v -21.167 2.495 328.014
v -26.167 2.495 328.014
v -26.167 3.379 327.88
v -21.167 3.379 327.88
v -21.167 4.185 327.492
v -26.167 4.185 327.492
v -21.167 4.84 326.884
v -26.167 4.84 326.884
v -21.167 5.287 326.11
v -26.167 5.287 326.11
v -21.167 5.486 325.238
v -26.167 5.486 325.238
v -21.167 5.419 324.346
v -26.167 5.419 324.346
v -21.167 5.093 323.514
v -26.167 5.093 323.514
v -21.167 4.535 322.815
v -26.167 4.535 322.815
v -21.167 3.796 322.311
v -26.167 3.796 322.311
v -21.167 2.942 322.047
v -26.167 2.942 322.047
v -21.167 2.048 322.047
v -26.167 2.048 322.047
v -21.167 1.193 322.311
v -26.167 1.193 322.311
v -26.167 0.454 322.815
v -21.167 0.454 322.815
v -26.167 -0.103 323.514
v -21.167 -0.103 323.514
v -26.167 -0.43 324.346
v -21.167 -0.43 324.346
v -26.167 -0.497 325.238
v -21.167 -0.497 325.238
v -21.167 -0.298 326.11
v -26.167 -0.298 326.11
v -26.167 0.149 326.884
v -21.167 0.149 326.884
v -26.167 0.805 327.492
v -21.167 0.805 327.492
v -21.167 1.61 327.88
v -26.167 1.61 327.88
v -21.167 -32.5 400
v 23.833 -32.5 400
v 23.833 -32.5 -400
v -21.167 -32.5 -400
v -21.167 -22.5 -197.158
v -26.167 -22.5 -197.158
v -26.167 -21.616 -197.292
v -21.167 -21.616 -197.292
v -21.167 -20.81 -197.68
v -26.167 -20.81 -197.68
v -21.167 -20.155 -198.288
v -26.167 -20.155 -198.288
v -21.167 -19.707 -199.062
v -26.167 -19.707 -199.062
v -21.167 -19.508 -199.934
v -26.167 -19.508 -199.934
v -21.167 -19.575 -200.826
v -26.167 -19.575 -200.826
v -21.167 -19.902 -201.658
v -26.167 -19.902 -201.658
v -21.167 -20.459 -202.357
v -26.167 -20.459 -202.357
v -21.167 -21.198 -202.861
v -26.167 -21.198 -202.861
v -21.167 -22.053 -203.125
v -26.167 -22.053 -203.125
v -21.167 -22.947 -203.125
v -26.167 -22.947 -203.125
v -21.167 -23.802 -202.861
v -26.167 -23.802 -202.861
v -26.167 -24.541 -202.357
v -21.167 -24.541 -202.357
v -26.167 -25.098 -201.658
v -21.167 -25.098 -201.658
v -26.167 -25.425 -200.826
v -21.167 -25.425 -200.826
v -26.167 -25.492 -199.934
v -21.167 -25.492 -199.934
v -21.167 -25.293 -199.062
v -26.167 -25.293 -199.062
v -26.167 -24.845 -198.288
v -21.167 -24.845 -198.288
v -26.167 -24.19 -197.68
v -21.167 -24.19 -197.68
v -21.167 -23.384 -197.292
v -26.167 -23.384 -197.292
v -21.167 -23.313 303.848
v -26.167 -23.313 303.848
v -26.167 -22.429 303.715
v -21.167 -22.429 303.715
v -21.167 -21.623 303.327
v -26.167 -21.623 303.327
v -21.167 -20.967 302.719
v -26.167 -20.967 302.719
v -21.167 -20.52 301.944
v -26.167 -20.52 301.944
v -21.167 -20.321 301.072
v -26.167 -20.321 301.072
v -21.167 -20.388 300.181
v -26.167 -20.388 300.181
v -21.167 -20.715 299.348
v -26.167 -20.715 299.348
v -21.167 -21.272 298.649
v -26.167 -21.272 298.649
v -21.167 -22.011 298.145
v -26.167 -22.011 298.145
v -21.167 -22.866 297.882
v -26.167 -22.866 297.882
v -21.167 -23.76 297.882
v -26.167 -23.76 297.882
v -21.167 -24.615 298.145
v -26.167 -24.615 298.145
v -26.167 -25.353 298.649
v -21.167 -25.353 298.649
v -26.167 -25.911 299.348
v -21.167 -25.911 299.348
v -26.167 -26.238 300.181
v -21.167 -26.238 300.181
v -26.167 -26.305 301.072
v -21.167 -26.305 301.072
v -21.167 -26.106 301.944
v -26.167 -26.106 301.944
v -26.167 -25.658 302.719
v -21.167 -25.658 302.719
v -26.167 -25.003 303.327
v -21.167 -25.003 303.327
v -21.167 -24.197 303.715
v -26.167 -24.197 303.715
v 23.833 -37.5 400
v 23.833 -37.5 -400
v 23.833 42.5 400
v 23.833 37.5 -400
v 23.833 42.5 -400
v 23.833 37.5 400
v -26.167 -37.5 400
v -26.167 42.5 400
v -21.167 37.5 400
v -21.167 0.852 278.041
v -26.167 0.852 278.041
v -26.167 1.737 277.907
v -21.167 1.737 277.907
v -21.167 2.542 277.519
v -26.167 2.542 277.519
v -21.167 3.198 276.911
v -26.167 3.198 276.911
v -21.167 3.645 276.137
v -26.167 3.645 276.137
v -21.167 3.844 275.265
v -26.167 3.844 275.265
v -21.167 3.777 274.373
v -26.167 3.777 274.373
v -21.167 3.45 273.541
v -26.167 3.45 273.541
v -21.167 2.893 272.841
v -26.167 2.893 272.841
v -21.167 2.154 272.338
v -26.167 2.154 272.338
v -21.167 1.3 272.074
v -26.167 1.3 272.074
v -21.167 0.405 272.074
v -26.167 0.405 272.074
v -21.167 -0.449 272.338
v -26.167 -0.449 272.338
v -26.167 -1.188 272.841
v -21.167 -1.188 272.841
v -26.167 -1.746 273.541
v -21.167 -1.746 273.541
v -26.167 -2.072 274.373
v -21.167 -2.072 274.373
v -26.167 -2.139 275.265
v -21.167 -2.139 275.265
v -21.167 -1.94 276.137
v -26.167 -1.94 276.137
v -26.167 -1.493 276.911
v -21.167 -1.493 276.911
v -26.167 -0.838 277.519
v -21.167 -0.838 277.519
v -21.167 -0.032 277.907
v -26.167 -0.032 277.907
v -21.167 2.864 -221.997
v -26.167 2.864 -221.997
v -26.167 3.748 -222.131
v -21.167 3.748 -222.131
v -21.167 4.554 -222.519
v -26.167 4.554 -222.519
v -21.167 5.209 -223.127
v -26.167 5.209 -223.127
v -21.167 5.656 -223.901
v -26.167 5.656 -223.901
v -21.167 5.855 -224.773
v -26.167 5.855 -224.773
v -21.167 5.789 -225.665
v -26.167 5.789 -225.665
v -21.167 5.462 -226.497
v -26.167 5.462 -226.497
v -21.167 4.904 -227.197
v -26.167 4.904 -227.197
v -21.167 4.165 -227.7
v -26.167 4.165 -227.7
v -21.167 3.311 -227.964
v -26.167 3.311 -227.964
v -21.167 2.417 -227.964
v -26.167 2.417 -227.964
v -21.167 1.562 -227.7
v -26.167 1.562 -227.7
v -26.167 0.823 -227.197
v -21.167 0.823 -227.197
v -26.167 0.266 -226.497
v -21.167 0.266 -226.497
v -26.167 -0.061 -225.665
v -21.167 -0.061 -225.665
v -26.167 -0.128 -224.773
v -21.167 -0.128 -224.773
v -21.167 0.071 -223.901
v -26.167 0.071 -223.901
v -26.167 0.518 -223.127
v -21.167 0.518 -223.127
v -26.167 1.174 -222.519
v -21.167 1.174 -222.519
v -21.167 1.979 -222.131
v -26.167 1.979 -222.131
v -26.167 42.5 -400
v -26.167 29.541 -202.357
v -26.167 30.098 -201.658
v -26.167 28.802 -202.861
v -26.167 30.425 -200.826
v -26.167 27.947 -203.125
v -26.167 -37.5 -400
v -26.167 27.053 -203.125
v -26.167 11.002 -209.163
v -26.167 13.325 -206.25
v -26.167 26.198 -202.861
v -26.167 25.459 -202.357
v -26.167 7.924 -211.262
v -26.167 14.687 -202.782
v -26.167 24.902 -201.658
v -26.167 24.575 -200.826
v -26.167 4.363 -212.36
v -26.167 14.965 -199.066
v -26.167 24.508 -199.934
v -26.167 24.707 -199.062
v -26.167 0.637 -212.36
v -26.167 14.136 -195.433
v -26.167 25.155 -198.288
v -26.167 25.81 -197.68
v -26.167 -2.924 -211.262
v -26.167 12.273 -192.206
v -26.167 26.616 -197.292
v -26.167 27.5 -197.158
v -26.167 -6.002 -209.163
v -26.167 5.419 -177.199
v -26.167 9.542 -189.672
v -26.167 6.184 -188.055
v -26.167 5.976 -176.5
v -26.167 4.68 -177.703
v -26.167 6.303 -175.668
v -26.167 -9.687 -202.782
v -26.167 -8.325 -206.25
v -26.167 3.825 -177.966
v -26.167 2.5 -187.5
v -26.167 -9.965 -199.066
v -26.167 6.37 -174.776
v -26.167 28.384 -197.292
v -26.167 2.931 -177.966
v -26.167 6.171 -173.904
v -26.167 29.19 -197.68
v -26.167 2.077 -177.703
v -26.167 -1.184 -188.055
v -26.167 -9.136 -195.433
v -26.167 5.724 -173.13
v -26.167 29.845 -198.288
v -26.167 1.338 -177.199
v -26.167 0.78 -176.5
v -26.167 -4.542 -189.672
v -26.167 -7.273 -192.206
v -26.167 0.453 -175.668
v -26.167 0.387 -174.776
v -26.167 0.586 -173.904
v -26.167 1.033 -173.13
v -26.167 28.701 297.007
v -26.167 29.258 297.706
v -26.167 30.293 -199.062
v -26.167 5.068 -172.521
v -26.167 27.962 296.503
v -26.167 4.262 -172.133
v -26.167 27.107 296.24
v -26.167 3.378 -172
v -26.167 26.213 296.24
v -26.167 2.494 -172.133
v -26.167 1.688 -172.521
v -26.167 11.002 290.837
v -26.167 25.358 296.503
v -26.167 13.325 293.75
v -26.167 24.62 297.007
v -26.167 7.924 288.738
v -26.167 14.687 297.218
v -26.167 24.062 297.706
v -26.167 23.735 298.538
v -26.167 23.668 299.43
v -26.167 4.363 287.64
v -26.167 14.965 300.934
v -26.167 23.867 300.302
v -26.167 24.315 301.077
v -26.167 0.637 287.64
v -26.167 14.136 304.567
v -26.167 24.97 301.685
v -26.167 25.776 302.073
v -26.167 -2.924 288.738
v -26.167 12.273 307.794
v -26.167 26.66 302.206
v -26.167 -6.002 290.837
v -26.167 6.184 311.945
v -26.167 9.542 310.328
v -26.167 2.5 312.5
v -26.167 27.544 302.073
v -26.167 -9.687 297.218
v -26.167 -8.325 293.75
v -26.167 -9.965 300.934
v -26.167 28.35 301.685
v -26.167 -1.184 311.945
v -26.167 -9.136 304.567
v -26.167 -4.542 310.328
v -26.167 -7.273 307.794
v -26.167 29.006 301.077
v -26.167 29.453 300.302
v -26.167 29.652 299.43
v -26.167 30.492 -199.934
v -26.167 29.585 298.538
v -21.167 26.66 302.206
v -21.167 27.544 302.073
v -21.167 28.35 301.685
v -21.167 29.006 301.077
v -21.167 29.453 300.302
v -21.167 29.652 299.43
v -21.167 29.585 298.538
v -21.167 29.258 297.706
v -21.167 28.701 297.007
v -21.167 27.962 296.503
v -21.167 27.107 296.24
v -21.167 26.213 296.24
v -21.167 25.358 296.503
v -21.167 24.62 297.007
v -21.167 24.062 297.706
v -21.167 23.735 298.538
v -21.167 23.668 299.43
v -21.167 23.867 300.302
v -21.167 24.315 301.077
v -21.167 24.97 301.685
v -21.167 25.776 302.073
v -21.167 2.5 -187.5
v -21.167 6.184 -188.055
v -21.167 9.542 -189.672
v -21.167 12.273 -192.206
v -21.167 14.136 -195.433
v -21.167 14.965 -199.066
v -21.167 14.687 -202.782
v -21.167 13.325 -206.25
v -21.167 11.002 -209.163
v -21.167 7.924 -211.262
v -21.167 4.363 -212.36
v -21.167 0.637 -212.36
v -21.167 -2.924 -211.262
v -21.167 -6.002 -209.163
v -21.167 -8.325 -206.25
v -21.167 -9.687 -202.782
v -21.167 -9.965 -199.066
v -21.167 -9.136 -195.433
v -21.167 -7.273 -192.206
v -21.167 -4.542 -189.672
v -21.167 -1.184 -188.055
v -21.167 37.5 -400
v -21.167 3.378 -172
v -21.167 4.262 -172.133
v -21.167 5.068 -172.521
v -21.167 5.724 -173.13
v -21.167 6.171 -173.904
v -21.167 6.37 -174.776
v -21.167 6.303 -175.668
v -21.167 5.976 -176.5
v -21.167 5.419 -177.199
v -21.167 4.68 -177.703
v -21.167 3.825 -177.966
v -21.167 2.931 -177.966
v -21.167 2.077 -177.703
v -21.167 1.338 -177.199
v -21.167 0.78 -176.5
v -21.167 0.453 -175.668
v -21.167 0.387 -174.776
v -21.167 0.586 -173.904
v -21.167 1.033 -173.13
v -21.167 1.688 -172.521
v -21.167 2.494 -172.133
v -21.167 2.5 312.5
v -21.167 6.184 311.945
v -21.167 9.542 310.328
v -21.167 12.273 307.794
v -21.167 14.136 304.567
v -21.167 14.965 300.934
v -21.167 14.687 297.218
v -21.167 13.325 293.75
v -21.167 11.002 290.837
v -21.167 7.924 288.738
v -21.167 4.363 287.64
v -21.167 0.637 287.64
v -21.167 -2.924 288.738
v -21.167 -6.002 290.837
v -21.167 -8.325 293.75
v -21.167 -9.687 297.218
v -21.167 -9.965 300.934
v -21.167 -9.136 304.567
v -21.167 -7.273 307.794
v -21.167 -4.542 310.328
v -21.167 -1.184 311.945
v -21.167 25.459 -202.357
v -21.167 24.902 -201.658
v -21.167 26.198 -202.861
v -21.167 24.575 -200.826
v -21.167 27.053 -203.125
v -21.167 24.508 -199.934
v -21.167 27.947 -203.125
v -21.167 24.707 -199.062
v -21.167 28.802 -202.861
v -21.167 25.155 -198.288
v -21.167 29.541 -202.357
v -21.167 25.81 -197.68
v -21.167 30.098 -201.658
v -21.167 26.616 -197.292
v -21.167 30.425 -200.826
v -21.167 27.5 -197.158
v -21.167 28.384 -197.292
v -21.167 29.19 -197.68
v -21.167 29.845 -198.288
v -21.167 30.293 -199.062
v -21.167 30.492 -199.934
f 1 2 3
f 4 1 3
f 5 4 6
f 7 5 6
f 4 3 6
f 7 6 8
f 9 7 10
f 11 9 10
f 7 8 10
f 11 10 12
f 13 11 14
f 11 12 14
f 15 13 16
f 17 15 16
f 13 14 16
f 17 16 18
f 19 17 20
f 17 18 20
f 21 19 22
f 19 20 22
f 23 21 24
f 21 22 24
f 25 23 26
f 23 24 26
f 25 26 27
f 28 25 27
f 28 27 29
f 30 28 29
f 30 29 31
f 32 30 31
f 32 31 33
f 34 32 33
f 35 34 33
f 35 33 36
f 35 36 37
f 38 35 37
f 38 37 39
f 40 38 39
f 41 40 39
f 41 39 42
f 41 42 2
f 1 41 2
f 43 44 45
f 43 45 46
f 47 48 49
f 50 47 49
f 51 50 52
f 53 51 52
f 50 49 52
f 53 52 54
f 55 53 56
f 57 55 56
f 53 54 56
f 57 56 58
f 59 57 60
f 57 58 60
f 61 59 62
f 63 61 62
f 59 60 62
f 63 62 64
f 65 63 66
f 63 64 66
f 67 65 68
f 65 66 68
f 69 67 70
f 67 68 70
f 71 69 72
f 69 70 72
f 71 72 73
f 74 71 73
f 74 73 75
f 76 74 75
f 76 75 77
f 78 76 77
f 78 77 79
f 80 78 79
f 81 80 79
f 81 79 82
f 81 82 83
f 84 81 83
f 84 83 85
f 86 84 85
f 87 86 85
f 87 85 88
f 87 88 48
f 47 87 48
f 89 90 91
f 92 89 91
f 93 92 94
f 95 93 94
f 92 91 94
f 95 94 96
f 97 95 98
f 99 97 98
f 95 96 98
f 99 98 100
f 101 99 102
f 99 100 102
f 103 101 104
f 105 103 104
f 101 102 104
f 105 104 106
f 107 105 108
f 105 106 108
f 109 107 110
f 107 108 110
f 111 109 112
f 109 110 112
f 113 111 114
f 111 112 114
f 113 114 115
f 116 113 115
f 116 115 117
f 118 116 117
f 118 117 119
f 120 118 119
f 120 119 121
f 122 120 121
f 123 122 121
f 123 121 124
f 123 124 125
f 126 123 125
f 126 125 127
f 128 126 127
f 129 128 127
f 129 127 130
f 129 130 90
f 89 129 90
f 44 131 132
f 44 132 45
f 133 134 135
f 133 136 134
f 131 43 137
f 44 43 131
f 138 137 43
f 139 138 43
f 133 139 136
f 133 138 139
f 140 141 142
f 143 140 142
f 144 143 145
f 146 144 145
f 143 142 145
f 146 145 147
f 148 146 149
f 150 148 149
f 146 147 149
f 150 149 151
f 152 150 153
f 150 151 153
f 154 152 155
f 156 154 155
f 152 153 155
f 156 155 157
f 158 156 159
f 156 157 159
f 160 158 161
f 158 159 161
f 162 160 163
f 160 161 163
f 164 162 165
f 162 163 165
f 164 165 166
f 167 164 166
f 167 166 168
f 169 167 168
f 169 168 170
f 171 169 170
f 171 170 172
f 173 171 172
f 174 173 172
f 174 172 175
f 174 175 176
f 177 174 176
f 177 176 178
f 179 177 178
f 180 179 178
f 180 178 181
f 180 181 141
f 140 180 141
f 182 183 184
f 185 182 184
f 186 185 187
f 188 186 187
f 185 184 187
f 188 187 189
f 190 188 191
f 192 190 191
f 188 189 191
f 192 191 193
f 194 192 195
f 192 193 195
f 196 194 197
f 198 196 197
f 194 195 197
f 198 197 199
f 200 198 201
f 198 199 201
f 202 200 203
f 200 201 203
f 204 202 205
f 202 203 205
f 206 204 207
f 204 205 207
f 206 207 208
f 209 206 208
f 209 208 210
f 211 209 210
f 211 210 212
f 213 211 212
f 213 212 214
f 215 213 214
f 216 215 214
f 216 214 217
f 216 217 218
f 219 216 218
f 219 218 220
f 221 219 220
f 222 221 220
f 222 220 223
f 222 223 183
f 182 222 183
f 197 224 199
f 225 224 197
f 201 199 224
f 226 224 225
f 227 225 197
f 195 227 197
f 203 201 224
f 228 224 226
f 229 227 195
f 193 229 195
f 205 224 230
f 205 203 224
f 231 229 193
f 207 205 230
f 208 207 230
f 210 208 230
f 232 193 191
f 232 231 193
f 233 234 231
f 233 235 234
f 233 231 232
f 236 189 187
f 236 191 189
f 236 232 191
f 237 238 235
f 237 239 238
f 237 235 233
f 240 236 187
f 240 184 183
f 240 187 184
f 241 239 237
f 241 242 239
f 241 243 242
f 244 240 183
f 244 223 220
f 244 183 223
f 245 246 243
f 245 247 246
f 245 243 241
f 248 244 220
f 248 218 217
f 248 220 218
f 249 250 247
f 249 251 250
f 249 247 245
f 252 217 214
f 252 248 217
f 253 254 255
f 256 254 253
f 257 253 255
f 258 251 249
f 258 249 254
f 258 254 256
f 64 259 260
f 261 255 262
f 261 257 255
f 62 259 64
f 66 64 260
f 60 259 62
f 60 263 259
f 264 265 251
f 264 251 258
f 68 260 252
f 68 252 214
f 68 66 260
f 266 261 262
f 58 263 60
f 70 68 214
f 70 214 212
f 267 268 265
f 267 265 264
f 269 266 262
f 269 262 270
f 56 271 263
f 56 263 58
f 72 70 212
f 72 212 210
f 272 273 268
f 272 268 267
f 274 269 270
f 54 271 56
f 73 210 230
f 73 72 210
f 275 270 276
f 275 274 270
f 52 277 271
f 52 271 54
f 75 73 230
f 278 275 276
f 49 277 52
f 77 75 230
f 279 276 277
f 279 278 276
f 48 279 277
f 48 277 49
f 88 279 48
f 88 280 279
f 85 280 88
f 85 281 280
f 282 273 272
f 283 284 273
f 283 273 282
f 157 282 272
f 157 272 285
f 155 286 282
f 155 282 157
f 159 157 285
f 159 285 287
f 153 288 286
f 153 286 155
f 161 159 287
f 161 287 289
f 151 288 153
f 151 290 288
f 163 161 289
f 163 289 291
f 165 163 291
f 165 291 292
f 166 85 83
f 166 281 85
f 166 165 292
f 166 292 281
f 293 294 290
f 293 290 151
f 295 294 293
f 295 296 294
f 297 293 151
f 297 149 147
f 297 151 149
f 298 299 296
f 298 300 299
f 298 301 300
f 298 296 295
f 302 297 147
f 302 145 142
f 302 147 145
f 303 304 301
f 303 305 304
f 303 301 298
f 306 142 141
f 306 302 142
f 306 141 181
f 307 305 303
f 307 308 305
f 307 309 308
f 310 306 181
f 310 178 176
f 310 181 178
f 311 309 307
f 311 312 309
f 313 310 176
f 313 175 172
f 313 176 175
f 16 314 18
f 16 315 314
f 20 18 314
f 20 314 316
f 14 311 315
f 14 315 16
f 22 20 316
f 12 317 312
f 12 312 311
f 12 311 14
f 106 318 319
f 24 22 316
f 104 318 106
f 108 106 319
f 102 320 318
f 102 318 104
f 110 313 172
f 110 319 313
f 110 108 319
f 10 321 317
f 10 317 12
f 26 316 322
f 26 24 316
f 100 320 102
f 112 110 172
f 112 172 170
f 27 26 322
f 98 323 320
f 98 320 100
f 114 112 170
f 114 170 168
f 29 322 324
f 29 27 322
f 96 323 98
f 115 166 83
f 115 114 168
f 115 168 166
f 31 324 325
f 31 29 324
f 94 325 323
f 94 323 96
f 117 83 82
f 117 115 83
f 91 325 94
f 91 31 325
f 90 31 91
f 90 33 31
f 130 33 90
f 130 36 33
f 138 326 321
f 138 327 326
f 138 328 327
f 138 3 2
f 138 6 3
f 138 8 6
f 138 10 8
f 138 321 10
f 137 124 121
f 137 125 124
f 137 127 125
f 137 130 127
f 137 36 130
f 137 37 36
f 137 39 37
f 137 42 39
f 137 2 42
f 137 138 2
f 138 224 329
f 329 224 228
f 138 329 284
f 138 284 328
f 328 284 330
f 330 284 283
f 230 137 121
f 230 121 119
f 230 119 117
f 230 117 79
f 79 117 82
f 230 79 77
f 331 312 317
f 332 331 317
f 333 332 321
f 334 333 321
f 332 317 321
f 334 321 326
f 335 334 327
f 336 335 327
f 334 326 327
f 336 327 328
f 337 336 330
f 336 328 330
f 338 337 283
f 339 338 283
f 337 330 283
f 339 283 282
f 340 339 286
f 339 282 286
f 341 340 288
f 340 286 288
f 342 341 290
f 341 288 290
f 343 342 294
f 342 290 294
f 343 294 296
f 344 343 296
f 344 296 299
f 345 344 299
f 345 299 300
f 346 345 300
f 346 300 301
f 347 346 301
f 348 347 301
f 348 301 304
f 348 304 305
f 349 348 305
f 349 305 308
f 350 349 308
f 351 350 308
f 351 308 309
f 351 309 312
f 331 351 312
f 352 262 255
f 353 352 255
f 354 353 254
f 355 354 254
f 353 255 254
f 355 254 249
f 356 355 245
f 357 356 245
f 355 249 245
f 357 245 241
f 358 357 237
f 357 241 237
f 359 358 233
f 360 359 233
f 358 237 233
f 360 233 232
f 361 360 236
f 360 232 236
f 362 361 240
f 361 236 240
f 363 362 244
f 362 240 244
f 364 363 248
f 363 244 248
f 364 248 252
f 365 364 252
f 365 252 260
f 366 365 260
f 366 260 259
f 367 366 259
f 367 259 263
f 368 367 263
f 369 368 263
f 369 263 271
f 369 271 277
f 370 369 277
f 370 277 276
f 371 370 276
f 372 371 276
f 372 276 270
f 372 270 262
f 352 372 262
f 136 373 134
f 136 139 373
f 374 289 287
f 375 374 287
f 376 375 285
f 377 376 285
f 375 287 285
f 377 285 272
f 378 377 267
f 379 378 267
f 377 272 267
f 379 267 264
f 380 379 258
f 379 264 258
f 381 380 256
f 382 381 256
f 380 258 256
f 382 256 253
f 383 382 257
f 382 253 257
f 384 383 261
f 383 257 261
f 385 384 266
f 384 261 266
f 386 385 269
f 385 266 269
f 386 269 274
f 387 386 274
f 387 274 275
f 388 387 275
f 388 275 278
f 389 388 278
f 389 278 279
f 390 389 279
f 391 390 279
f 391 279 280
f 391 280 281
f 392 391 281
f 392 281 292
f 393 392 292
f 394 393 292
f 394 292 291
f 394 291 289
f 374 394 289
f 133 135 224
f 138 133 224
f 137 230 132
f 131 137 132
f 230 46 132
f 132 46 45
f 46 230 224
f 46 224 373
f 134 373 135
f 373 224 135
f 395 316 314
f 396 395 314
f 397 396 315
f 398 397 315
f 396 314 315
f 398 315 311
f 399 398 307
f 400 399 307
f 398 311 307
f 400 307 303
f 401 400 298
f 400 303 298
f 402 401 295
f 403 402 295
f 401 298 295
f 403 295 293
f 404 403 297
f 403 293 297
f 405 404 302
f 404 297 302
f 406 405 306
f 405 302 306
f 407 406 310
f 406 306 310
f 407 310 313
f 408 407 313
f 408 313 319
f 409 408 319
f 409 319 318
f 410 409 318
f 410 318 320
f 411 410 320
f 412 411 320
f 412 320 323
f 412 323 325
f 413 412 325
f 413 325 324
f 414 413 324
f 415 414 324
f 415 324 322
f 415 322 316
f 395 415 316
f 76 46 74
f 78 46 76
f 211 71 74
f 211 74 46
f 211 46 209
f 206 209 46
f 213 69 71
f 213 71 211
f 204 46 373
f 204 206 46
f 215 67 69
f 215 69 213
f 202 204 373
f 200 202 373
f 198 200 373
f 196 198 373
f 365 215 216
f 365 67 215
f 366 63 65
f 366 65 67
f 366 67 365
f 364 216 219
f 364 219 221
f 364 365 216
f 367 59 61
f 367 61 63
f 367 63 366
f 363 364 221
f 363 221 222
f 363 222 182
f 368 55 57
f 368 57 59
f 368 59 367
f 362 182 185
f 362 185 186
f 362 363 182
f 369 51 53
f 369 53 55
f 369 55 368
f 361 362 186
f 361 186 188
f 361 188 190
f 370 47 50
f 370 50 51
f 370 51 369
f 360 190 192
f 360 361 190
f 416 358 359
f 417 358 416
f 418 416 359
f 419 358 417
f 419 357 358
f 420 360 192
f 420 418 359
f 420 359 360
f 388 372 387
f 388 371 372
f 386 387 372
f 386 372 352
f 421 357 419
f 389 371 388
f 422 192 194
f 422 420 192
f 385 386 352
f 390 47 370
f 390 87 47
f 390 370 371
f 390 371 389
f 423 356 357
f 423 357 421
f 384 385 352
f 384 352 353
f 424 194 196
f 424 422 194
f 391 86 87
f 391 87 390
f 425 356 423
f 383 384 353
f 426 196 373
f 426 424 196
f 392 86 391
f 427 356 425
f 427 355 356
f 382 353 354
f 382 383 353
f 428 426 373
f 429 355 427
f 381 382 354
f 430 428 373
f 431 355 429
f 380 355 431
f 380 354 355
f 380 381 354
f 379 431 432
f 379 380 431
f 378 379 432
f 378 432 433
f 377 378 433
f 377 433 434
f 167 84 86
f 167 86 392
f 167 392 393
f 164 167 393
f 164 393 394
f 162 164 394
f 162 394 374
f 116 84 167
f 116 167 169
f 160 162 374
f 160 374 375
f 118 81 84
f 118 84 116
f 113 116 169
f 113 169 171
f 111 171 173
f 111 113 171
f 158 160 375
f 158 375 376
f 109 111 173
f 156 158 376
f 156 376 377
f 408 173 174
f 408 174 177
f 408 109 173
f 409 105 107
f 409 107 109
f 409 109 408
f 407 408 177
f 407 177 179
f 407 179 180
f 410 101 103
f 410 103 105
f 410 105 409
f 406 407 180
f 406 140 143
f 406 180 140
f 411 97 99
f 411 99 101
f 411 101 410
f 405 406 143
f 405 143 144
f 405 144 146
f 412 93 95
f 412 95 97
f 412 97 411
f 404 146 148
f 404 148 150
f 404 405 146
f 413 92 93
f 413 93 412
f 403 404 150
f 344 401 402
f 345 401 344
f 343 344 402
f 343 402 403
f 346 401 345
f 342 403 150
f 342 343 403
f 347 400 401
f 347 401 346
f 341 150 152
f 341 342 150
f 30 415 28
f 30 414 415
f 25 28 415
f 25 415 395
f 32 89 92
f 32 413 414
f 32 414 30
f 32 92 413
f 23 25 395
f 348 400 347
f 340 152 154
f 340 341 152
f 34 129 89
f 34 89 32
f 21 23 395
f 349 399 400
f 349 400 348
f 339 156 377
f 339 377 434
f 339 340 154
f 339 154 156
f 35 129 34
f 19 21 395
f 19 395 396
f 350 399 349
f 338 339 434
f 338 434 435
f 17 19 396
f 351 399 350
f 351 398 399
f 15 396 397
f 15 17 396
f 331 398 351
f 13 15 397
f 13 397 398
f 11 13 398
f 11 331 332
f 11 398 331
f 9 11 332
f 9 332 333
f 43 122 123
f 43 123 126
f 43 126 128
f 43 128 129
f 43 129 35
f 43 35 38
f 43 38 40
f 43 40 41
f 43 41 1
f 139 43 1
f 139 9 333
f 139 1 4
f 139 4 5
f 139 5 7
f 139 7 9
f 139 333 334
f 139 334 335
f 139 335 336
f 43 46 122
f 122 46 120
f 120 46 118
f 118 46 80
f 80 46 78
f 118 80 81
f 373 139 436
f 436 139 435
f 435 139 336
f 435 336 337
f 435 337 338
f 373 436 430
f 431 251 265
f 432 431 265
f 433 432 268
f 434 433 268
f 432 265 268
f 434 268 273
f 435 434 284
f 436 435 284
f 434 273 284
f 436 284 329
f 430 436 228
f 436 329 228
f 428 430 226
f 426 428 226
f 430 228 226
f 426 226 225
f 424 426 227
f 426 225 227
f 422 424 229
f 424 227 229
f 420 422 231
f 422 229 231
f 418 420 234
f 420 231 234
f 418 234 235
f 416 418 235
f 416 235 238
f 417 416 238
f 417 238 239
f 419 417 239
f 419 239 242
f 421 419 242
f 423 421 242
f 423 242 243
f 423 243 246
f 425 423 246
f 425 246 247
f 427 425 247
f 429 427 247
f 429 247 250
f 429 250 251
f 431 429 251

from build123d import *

# Parameters (mm, degrees)
BOSS_EXTRUDE1_DEPTH     = 400
SKETCH2_R               = 12.5
CUT_EXTRUDE1_DEPTH      = 1
CUT_EXTRUDE1_DEPTH_BACK = 51
SKETCH4_R               = 3
CUT_EXTRUDE2_DEPTH      = 1
CUT_EXTRUDE2_DEPTH_BACK = 51
SKETCH6_R               = 3
CUT_EXTRUDE3_DEPTH      = 1
CUT_EXTRUDE3_DEPTH_BACK = 51


with BuildPart() as part:
    # Sketch1 → Boss-Extrude1 (new body, symmetric)
    with BuildSketch(Plane.XY):
        Polygon((23.833333333, 42.5), (-26.166666667, 42.5), (-26.166666667, -37.5), (23.833333333, -37.5), (23.833333333, -32.5), (-21.166666667, -32.5), (-21.166666667, 37.5), (23.833333333, 37.5), align=None)
    extrude(amount=BOSS_EXTRUDE1_DEPTH, both=True)

    # Sketch2 → Cut-Extrude1 (cut, two sides)
    with BuildSketch(Plane.ZY.offset(26.166666667)) as cut_extrude1_sk:
        with Locations((-200, 2.5)):
            Circle(SKETCH2_R)
        with Locations((300, 2.5)):
            Circle(SKETCH2_R)
    extrude(amount=CUT_EXTRUDE1_DEPTH, mode=Mode.SUBTRACT)
    extrude(cut_extrude1_sk.sketch, amount=-CUT_EXTRUDE1_DEPTH_BACK, mode=Mode.SUBTRACT)

    # Sketch4 → Cut-Extrude2 (cut, two sides)
    with BuildSketch(Plane.ZY.offset(26.166666667)) as cut_extrude2_sk:
        with Locations((-200.1583434, 27.5)):
            Circle(SKETCH4_R)
        with Locations((-200.1583434, -22.5)):
            Circle(SKETCH4_R)
        with Locations((-175, 3.378177917)):
            Circle(SKETCH4_R)
        with Locations((-224.997353573, 2.863750384)):
            Circle(SKETCH4_R)
    extrude(amount=CUT_EXTRUDE2_DEPTH, mode=Mode.SUBTRACT)
    extrude(cut_extrude2_sk.sketch, amount=-CUT_EXTRUDE2_DEPTH_BACK, mode=Mode.SUBTRACT)

    # Sketch6 → Cut-Extrude3 (cut, two sides)
    with BuildSketch(Plane.ZY.offset(26.166666667)) as cut_extrude3_sk:
        with Locations((299.206047638, 26.660043497)):
            Circle(SKETCH6_R)
        with Locations((325.01367144, 2.494643569)):
            Circle(SKETCH6_R)
        with Locations((300.848271512, -23.312980234)):
            Circle(SKETCH6_R)
        with Locations((275.04064771, 0.852419694)):
            Circle(SKETCH6_R)
    extrude(amount=CUT_EXTRUDE3_DEPTH, mode=Mode.SUBTRACT)
    extrude(cut_extrude3_sk.sketch, amount=-CUT_EXTRUDE3_DEPTH_BACK, mode=Mode.SUBTRACT)


solid = part.part
